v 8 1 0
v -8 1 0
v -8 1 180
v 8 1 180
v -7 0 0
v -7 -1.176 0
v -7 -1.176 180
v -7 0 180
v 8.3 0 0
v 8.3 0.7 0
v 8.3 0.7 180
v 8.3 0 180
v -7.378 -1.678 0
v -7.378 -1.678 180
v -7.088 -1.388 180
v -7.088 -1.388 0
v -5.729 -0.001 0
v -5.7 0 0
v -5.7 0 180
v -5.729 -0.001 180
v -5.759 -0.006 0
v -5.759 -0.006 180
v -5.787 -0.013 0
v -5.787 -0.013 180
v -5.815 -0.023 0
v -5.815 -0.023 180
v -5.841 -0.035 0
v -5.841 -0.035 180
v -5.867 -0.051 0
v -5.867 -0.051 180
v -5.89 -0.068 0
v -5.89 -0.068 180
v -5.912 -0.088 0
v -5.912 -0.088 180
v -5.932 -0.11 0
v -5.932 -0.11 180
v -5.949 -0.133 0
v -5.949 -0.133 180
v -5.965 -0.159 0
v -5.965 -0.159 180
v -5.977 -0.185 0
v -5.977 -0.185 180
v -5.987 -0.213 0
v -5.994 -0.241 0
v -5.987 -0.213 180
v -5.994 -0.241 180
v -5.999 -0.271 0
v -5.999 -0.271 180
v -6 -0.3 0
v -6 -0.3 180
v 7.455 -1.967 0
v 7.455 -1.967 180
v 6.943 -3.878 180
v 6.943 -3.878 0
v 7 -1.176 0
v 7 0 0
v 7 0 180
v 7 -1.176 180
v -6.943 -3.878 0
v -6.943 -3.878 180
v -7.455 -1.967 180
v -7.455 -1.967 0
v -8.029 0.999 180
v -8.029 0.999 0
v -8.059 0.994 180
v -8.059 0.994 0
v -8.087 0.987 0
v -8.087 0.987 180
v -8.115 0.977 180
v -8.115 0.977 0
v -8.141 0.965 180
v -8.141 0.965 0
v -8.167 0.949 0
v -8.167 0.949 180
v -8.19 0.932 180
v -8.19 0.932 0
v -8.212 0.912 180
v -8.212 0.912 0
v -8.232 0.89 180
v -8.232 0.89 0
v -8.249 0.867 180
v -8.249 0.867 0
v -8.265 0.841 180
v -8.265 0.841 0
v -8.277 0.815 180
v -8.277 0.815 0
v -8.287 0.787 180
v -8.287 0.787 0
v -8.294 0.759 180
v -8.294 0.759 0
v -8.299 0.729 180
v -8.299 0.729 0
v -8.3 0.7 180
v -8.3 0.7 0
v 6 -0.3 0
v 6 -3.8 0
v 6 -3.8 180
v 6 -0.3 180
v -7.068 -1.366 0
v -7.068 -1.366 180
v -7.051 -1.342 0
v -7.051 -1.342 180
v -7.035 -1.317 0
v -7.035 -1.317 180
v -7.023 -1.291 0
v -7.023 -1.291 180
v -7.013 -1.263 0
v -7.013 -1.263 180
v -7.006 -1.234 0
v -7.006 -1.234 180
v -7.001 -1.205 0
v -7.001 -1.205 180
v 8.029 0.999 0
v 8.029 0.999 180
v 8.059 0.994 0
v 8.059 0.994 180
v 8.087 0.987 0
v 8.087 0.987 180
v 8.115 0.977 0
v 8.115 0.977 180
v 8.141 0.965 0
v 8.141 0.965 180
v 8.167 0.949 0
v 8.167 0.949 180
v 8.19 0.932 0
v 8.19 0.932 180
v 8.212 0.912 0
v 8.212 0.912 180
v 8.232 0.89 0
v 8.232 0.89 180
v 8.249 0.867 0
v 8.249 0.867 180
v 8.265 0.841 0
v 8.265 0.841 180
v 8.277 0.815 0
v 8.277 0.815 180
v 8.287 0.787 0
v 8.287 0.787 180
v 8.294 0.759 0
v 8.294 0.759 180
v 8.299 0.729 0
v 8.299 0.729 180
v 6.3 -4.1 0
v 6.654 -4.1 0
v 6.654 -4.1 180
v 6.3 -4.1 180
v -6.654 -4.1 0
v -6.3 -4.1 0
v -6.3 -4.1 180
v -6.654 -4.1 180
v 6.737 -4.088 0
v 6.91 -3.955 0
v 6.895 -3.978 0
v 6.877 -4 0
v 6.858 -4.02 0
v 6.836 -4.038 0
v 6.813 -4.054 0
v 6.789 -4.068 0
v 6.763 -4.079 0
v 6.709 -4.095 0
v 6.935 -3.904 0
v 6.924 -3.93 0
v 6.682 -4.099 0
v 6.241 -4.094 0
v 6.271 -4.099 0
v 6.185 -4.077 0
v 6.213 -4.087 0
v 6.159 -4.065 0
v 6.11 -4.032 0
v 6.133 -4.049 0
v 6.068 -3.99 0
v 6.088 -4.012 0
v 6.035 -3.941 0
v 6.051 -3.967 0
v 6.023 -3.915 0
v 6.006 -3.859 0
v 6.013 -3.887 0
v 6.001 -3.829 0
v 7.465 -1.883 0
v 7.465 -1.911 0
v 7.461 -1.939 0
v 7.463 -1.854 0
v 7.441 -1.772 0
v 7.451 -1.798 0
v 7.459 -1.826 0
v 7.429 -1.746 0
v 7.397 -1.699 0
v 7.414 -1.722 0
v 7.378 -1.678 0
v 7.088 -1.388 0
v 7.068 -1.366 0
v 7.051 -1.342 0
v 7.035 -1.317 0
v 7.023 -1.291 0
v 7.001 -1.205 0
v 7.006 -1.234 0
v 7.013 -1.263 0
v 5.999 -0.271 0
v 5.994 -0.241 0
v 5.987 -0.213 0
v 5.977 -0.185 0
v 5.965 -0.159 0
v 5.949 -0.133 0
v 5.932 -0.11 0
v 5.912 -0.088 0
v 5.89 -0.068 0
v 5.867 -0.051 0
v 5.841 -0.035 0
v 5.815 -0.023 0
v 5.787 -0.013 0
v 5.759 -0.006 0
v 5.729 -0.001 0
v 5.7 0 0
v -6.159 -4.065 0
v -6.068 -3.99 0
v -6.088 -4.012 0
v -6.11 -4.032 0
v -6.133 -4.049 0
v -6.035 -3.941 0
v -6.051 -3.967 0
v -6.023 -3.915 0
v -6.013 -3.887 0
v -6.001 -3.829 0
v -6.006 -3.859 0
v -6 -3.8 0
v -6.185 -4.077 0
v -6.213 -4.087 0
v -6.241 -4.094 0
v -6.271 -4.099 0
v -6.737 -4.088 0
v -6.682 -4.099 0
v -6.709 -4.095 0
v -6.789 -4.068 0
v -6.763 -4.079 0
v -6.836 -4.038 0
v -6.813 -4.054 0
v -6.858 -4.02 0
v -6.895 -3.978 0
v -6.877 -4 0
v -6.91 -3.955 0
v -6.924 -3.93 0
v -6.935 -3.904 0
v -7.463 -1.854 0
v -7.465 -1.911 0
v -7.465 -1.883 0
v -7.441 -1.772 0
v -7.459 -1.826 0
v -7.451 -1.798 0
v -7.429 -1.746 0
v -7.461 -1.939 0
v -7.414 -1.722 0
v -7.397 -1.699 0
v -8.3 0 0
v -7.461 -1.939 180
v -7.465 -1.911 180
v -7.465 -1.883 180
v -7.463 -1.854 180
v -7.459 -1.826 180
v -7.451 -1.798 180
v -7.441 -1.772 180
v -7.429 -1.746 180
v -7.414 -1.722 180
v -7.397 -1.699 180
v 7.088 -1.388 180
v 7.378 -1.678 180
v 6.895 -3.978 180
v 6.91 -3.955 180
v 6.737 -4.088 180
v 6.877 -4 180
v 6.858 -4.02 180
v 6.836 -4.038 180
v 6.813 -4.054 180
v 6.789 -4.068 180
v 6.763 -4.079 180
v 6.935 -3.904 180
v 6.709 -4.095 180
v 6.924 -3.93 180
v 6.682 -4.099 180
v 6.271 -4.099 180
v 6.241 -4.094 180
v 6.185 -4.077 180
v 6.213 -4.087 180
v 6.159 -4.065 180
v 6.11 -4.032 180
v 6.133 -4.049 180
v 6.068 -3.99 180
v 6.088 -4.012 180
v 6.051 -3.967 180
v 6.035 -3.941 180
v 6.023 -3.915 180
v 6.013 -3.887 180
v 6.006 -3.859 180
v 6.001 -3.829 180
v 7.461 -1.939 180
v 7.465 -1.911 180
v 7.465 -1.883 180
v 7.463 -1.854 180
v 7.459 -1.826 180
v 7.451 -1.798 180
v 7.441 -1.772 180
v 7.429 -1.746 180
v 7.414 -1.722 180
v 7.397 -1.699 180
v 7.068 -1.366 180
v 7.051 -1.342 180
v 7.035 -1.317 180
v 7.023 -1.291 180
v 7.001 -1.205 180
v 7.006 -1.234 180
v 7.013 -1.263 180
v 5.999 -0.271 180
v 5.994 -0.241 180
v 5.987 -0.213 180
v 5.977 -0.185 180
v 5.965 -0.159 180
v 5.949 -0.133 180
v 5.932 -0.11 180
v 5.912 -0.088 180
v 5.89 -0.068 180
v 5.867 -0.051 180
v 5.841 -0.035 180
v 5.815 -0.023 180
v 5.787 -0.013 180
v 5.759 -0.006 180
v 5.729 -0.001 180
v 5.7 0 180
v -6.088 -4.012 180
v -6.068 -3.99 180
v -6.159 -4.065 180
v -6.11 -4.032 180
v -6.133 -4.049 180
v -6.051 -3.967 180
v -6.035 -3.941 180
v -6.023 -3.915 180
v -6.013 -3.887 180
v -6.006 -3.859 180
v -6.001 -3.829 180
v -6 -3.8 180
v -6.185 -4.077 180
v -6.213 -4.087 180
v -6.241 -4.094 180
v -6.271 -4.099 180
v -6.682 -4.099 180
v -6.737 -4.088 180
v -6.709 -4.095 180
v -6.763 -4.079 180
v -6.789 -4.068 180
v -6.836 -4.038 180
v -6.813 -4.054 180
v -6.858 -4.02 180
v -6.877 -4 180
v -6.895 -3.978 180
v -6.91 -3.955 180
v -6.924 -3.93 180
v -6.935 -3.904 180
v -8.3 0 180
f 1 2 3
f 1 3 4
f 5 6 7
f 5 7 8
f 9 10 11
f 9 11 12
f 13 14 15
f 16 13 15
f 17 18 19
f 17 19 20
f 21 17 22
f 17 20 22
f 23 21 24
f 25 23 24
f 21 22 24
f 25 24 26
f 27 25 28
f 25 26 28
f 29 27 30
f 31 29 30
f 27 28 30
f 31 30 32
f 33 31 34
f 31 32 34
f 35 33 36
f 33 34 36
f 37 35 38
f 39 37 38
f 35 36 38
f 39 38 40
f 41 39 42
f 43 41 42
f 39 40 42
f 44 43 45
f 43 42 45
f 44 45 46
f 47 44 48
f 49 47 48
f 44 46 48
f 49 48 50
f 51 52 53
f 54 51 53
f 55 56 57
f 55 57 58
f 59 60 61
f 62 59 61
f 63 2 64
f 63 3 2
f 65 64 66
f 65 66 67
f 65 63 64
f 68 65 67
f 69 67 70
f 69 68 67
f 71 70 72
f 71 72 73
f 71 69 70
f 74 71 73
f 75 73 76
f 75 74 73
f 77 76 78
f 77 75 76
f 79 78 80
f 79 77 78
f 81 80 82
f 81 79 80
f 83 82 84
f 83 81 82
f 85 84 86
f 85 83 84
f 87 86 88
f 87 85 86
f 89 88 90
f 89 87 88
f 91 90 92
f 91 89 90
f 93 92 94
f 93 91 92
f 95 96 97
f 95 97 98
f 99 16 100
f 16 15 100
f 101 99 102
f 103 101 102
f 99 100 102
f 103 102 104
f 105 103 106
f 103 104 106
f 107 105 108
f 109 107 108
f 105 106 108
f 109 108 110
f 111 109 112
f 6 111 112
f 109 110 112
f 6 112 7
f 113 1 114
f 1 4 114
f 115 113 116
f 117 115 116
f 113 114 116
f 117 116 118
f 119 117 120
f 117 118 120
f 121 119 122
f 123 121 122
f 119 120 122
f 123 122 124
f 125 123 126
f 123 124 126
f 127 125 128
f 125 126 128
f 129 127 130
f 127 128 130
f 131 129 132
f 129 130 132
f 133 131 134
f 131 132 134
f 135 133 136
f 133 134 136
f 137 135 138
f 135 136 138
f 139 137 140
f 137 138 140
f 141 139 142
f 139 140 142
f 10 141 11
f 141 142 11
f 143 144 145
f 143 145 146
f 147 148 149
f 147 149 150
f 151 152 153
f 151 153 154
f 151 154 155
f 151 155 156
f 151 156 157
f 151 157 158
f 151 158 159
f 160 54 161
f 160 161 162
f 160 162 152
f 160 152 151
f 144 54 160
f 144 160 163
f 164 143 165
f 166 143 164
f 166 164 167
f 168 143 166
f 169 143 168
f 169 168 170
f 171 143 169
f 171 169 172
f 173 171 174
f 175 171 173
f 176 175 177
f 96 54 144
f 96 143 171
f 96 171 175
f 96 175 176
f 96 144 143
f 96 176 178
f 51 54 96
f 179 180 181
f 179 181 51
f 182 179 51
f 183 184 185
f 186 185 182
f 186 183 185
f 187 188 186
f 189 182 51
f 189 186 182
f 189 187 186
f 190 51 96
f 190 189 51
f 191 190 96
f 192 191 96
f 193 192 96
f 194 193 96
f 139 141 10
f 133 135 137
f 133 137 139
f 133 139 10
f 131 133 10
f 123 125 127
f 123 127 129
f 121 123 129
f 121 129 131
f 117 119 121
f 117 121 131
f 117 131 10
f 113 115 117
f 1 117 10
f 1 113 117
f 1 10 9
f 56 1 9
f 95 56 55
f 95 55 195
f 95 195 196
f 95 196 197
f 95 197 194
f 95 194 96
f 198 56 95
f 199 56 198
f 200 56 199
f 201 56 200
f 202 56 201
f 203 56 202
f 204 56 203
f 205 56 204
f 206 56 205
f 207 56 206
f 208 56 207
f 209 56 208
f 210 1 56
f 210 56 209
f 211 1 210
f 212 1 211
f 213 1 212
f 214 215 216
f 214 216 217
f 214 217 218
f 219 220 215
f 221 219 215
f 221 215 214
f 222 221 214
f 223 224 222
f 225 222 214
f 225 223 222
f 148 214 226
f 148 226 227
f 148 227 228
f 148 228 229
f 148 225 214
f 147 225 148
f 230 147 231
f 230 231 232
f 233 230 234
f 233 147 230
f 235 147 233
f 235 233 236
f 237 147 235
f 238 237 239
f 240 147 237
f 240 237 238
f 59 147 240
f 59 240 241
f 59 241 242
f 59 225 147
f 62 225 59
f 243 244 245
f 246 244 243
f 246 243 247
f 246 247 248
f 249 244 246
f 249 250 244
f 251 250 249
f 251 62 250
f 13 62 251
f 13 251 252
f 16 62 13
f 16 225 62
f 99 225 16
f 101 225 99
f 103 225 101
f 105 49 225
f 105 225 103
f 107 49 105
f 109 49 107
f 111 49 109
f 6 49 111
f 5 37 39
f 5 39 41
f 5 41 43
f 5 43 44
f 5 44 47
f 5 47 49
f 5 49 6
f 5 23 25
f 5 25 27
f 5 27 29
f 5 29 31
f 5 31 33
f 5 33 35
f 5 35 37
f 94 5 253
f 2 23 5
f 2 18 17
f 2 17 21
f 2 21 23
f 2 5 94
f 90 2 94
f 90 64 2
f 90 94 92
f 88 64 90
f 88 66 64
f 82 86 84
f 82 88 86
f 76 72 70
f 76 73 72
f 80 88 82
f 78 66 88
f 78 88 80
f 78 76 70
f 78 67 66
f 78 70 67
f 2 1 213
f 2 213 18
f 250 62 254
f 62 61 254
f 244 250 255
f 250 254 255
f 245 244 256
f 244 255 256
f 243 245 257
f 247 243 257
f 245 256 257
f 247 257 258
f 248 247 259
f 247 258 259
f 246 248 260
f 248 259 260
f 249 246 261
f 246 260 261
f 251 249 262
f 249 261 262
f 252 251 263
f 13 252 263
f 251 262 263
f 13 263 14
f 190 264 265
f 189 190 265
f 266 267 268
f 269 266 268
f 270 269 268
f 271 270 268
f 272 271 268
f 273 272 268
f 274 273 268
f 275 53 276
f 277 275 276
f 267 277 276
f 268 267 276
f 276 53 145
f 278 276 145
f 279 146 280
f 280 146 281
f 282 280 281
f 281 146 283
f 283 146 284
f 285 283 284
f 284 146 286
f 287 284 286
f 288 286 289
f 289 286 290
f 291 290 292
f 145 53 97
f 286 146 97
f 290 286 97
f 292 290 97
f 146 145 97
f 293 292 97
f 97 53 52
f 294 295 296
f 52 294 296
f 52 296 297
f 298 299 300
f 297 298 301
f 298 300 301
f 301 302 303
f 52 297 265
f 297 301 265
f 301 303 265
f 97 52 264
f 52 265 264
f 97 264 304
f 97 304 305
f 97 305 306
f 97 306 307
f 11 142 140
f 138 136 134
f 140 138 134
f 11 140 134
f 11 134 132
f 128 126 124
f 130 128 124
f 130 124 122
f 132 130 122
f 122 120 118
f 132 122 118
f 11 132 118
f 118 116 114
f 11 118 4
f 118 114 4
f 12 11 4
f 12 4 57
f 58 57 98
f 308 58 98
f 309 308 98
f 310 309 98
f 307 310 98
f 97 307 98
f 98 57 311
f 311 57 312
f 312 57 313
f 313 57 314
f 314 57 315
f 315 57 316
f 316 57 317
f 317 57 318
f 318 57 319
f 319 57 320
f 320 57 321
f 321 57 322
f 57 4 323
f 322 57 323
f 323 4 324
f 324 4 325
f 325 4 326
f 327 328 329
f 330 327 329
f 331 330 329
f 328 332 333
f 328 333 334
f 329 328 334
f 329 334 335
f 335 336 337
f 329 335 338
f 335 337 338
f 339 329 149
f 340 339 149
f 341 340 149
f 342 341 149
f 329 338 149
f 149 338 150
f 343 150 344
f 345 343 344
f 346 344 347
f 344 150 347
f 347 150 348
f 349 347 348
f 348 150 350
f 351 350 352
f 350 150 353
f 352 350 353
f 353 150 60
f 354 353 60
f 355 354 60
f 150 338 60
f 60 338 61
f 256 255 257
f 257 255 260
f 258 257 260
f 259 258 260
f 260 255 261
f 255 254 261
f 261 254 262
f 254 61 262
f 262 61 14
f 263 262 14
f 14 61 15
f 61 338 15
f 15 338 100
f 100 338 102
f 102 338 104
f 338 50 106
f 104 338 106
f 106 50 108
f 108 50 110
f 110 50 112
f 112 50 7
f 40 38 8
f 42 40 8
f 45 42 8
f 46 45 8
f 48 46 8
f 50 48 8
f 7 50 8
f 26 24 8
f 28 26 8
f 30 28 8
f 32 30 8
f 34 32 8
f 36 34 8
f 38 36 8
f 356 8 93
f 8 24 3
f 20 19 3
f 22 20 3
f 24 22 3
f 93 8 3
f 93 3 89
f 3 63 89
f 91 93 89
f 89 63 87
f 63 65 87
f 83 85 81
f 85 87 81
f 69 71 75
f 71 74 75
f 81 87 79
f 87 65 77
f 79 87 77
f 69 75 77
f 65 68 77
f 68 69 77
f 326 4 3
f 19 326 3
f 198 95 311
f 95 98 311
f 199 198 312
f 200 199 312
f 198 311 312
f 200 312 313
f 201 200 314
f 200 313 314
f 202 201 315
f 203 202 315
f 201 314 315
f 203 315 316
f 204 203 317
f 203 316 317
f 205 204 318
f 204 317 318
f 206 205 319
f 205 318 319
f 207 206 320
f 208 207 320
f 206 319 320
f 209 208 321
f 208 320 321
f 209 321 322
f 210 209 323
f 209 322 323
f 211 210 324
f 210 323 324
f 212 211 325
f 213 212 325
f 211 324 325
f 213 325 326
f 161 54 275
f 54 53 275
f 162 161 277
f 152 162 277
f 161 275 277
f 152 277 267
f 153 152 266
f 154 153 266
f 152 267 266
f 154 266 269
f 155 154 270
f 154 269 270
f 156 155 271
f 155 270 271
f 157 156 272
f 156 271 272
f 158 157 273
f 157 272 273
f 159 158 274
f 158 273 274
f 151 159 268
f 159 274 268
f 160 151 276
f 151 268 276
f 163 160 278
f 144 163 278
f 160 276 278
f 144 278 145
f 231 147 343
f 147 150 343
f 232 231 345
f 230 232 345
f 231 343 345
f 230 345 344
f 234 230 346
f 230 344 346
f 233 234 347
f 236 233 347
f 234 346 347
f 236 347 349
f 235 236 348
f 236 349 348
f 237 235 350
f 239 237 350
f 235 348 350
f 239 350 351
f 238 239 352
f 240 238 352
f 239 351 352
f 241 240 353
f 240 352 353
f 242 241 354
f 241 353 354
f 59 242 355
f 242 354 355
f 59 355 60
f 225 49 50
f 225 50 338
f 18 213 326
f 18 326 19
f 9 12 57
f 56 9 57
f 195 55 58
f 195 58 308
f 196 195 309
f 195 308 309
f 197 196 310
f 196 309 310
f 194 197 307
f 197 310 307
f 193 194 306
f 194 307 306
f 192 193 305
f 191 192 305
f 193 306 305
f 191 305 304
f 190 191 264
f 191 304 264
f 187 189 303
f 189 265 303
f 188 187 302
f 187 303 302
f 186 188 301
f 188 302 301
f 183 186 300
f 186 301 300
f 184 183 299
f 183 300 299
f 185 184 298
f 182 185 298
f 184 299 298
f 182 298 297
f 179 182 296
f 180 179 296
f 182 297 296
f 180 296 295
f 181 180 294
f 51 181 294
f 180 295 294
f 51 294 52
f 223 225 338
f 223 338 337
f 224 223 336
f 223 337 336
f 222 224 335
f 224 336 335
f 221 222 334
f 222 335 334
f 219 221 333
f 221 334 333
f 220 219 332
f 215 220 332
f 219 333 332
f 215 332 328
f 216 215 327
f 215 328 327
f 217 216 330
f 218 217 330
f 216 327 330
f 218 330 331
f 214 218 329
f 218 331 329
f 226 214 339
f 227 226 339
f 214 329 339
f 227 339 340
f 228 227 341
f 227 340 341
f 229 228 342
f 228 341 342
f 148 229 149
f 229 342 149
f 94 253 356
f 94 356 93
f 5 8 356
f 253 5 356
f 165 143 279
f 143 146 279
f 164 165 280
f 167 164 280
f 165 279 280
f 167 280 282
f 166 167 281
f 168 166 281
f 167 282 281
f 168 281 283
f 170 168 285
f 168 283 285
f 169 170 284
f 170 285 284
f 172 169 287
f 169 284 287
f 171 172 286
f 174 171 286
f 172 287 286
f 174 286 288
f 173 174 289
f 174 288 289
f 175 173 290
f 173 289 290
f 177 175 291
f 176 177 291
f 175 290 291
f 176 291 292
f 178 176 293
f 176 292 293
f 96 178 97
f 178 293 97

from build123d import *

# Parameters (mm, degrees)
BOSS_EXTRUDE1_DEPTH = 180
FILLET1_R           = 0.3


with BuildPart() as part:
    # Sketch1 → Boss-Extrude1 (new body)
    with BuildSketch(Plane.XY):
        Polygon((-8.3, 1), (8.3, 1), (8.3, 0), (7, 0), (7, -1.3), (7.5, -1.8), (6.883716857, -4.1), (6, -4.1), (6, 0), (-6, 0), (-6, -4.1), (-6.883716857, -4.1), (-7.5, -1.8), (-7, -1.3), (-7, 0), (-8.3, 0), align=None)
    extrude(amount=BOSS_EXTRUDE1_DEPTH)

    # Fillet1
    fillet1_edges = [part.edges().sort_by_distance(p)[0] for p in [
        (-8.3, 1, 90),
        (8.3, 1, 90),
        (7, -1.3, 90),
        (7.5, -1.8, 90),
        (6.883716857, -4.1, 90),
        (6, -4.1, 90),
        (6, 0, 90),
        (-6, 0, 90),
        (-6, -4.1, 90),
        (-6.883716857, -4.1, 90),
        (-7.5, -1.8, 90),
        (-7, -1.3, 90),
    ]]
    fillet(fillet1_edges, radius=FILLET1_R)


solid = part.part
